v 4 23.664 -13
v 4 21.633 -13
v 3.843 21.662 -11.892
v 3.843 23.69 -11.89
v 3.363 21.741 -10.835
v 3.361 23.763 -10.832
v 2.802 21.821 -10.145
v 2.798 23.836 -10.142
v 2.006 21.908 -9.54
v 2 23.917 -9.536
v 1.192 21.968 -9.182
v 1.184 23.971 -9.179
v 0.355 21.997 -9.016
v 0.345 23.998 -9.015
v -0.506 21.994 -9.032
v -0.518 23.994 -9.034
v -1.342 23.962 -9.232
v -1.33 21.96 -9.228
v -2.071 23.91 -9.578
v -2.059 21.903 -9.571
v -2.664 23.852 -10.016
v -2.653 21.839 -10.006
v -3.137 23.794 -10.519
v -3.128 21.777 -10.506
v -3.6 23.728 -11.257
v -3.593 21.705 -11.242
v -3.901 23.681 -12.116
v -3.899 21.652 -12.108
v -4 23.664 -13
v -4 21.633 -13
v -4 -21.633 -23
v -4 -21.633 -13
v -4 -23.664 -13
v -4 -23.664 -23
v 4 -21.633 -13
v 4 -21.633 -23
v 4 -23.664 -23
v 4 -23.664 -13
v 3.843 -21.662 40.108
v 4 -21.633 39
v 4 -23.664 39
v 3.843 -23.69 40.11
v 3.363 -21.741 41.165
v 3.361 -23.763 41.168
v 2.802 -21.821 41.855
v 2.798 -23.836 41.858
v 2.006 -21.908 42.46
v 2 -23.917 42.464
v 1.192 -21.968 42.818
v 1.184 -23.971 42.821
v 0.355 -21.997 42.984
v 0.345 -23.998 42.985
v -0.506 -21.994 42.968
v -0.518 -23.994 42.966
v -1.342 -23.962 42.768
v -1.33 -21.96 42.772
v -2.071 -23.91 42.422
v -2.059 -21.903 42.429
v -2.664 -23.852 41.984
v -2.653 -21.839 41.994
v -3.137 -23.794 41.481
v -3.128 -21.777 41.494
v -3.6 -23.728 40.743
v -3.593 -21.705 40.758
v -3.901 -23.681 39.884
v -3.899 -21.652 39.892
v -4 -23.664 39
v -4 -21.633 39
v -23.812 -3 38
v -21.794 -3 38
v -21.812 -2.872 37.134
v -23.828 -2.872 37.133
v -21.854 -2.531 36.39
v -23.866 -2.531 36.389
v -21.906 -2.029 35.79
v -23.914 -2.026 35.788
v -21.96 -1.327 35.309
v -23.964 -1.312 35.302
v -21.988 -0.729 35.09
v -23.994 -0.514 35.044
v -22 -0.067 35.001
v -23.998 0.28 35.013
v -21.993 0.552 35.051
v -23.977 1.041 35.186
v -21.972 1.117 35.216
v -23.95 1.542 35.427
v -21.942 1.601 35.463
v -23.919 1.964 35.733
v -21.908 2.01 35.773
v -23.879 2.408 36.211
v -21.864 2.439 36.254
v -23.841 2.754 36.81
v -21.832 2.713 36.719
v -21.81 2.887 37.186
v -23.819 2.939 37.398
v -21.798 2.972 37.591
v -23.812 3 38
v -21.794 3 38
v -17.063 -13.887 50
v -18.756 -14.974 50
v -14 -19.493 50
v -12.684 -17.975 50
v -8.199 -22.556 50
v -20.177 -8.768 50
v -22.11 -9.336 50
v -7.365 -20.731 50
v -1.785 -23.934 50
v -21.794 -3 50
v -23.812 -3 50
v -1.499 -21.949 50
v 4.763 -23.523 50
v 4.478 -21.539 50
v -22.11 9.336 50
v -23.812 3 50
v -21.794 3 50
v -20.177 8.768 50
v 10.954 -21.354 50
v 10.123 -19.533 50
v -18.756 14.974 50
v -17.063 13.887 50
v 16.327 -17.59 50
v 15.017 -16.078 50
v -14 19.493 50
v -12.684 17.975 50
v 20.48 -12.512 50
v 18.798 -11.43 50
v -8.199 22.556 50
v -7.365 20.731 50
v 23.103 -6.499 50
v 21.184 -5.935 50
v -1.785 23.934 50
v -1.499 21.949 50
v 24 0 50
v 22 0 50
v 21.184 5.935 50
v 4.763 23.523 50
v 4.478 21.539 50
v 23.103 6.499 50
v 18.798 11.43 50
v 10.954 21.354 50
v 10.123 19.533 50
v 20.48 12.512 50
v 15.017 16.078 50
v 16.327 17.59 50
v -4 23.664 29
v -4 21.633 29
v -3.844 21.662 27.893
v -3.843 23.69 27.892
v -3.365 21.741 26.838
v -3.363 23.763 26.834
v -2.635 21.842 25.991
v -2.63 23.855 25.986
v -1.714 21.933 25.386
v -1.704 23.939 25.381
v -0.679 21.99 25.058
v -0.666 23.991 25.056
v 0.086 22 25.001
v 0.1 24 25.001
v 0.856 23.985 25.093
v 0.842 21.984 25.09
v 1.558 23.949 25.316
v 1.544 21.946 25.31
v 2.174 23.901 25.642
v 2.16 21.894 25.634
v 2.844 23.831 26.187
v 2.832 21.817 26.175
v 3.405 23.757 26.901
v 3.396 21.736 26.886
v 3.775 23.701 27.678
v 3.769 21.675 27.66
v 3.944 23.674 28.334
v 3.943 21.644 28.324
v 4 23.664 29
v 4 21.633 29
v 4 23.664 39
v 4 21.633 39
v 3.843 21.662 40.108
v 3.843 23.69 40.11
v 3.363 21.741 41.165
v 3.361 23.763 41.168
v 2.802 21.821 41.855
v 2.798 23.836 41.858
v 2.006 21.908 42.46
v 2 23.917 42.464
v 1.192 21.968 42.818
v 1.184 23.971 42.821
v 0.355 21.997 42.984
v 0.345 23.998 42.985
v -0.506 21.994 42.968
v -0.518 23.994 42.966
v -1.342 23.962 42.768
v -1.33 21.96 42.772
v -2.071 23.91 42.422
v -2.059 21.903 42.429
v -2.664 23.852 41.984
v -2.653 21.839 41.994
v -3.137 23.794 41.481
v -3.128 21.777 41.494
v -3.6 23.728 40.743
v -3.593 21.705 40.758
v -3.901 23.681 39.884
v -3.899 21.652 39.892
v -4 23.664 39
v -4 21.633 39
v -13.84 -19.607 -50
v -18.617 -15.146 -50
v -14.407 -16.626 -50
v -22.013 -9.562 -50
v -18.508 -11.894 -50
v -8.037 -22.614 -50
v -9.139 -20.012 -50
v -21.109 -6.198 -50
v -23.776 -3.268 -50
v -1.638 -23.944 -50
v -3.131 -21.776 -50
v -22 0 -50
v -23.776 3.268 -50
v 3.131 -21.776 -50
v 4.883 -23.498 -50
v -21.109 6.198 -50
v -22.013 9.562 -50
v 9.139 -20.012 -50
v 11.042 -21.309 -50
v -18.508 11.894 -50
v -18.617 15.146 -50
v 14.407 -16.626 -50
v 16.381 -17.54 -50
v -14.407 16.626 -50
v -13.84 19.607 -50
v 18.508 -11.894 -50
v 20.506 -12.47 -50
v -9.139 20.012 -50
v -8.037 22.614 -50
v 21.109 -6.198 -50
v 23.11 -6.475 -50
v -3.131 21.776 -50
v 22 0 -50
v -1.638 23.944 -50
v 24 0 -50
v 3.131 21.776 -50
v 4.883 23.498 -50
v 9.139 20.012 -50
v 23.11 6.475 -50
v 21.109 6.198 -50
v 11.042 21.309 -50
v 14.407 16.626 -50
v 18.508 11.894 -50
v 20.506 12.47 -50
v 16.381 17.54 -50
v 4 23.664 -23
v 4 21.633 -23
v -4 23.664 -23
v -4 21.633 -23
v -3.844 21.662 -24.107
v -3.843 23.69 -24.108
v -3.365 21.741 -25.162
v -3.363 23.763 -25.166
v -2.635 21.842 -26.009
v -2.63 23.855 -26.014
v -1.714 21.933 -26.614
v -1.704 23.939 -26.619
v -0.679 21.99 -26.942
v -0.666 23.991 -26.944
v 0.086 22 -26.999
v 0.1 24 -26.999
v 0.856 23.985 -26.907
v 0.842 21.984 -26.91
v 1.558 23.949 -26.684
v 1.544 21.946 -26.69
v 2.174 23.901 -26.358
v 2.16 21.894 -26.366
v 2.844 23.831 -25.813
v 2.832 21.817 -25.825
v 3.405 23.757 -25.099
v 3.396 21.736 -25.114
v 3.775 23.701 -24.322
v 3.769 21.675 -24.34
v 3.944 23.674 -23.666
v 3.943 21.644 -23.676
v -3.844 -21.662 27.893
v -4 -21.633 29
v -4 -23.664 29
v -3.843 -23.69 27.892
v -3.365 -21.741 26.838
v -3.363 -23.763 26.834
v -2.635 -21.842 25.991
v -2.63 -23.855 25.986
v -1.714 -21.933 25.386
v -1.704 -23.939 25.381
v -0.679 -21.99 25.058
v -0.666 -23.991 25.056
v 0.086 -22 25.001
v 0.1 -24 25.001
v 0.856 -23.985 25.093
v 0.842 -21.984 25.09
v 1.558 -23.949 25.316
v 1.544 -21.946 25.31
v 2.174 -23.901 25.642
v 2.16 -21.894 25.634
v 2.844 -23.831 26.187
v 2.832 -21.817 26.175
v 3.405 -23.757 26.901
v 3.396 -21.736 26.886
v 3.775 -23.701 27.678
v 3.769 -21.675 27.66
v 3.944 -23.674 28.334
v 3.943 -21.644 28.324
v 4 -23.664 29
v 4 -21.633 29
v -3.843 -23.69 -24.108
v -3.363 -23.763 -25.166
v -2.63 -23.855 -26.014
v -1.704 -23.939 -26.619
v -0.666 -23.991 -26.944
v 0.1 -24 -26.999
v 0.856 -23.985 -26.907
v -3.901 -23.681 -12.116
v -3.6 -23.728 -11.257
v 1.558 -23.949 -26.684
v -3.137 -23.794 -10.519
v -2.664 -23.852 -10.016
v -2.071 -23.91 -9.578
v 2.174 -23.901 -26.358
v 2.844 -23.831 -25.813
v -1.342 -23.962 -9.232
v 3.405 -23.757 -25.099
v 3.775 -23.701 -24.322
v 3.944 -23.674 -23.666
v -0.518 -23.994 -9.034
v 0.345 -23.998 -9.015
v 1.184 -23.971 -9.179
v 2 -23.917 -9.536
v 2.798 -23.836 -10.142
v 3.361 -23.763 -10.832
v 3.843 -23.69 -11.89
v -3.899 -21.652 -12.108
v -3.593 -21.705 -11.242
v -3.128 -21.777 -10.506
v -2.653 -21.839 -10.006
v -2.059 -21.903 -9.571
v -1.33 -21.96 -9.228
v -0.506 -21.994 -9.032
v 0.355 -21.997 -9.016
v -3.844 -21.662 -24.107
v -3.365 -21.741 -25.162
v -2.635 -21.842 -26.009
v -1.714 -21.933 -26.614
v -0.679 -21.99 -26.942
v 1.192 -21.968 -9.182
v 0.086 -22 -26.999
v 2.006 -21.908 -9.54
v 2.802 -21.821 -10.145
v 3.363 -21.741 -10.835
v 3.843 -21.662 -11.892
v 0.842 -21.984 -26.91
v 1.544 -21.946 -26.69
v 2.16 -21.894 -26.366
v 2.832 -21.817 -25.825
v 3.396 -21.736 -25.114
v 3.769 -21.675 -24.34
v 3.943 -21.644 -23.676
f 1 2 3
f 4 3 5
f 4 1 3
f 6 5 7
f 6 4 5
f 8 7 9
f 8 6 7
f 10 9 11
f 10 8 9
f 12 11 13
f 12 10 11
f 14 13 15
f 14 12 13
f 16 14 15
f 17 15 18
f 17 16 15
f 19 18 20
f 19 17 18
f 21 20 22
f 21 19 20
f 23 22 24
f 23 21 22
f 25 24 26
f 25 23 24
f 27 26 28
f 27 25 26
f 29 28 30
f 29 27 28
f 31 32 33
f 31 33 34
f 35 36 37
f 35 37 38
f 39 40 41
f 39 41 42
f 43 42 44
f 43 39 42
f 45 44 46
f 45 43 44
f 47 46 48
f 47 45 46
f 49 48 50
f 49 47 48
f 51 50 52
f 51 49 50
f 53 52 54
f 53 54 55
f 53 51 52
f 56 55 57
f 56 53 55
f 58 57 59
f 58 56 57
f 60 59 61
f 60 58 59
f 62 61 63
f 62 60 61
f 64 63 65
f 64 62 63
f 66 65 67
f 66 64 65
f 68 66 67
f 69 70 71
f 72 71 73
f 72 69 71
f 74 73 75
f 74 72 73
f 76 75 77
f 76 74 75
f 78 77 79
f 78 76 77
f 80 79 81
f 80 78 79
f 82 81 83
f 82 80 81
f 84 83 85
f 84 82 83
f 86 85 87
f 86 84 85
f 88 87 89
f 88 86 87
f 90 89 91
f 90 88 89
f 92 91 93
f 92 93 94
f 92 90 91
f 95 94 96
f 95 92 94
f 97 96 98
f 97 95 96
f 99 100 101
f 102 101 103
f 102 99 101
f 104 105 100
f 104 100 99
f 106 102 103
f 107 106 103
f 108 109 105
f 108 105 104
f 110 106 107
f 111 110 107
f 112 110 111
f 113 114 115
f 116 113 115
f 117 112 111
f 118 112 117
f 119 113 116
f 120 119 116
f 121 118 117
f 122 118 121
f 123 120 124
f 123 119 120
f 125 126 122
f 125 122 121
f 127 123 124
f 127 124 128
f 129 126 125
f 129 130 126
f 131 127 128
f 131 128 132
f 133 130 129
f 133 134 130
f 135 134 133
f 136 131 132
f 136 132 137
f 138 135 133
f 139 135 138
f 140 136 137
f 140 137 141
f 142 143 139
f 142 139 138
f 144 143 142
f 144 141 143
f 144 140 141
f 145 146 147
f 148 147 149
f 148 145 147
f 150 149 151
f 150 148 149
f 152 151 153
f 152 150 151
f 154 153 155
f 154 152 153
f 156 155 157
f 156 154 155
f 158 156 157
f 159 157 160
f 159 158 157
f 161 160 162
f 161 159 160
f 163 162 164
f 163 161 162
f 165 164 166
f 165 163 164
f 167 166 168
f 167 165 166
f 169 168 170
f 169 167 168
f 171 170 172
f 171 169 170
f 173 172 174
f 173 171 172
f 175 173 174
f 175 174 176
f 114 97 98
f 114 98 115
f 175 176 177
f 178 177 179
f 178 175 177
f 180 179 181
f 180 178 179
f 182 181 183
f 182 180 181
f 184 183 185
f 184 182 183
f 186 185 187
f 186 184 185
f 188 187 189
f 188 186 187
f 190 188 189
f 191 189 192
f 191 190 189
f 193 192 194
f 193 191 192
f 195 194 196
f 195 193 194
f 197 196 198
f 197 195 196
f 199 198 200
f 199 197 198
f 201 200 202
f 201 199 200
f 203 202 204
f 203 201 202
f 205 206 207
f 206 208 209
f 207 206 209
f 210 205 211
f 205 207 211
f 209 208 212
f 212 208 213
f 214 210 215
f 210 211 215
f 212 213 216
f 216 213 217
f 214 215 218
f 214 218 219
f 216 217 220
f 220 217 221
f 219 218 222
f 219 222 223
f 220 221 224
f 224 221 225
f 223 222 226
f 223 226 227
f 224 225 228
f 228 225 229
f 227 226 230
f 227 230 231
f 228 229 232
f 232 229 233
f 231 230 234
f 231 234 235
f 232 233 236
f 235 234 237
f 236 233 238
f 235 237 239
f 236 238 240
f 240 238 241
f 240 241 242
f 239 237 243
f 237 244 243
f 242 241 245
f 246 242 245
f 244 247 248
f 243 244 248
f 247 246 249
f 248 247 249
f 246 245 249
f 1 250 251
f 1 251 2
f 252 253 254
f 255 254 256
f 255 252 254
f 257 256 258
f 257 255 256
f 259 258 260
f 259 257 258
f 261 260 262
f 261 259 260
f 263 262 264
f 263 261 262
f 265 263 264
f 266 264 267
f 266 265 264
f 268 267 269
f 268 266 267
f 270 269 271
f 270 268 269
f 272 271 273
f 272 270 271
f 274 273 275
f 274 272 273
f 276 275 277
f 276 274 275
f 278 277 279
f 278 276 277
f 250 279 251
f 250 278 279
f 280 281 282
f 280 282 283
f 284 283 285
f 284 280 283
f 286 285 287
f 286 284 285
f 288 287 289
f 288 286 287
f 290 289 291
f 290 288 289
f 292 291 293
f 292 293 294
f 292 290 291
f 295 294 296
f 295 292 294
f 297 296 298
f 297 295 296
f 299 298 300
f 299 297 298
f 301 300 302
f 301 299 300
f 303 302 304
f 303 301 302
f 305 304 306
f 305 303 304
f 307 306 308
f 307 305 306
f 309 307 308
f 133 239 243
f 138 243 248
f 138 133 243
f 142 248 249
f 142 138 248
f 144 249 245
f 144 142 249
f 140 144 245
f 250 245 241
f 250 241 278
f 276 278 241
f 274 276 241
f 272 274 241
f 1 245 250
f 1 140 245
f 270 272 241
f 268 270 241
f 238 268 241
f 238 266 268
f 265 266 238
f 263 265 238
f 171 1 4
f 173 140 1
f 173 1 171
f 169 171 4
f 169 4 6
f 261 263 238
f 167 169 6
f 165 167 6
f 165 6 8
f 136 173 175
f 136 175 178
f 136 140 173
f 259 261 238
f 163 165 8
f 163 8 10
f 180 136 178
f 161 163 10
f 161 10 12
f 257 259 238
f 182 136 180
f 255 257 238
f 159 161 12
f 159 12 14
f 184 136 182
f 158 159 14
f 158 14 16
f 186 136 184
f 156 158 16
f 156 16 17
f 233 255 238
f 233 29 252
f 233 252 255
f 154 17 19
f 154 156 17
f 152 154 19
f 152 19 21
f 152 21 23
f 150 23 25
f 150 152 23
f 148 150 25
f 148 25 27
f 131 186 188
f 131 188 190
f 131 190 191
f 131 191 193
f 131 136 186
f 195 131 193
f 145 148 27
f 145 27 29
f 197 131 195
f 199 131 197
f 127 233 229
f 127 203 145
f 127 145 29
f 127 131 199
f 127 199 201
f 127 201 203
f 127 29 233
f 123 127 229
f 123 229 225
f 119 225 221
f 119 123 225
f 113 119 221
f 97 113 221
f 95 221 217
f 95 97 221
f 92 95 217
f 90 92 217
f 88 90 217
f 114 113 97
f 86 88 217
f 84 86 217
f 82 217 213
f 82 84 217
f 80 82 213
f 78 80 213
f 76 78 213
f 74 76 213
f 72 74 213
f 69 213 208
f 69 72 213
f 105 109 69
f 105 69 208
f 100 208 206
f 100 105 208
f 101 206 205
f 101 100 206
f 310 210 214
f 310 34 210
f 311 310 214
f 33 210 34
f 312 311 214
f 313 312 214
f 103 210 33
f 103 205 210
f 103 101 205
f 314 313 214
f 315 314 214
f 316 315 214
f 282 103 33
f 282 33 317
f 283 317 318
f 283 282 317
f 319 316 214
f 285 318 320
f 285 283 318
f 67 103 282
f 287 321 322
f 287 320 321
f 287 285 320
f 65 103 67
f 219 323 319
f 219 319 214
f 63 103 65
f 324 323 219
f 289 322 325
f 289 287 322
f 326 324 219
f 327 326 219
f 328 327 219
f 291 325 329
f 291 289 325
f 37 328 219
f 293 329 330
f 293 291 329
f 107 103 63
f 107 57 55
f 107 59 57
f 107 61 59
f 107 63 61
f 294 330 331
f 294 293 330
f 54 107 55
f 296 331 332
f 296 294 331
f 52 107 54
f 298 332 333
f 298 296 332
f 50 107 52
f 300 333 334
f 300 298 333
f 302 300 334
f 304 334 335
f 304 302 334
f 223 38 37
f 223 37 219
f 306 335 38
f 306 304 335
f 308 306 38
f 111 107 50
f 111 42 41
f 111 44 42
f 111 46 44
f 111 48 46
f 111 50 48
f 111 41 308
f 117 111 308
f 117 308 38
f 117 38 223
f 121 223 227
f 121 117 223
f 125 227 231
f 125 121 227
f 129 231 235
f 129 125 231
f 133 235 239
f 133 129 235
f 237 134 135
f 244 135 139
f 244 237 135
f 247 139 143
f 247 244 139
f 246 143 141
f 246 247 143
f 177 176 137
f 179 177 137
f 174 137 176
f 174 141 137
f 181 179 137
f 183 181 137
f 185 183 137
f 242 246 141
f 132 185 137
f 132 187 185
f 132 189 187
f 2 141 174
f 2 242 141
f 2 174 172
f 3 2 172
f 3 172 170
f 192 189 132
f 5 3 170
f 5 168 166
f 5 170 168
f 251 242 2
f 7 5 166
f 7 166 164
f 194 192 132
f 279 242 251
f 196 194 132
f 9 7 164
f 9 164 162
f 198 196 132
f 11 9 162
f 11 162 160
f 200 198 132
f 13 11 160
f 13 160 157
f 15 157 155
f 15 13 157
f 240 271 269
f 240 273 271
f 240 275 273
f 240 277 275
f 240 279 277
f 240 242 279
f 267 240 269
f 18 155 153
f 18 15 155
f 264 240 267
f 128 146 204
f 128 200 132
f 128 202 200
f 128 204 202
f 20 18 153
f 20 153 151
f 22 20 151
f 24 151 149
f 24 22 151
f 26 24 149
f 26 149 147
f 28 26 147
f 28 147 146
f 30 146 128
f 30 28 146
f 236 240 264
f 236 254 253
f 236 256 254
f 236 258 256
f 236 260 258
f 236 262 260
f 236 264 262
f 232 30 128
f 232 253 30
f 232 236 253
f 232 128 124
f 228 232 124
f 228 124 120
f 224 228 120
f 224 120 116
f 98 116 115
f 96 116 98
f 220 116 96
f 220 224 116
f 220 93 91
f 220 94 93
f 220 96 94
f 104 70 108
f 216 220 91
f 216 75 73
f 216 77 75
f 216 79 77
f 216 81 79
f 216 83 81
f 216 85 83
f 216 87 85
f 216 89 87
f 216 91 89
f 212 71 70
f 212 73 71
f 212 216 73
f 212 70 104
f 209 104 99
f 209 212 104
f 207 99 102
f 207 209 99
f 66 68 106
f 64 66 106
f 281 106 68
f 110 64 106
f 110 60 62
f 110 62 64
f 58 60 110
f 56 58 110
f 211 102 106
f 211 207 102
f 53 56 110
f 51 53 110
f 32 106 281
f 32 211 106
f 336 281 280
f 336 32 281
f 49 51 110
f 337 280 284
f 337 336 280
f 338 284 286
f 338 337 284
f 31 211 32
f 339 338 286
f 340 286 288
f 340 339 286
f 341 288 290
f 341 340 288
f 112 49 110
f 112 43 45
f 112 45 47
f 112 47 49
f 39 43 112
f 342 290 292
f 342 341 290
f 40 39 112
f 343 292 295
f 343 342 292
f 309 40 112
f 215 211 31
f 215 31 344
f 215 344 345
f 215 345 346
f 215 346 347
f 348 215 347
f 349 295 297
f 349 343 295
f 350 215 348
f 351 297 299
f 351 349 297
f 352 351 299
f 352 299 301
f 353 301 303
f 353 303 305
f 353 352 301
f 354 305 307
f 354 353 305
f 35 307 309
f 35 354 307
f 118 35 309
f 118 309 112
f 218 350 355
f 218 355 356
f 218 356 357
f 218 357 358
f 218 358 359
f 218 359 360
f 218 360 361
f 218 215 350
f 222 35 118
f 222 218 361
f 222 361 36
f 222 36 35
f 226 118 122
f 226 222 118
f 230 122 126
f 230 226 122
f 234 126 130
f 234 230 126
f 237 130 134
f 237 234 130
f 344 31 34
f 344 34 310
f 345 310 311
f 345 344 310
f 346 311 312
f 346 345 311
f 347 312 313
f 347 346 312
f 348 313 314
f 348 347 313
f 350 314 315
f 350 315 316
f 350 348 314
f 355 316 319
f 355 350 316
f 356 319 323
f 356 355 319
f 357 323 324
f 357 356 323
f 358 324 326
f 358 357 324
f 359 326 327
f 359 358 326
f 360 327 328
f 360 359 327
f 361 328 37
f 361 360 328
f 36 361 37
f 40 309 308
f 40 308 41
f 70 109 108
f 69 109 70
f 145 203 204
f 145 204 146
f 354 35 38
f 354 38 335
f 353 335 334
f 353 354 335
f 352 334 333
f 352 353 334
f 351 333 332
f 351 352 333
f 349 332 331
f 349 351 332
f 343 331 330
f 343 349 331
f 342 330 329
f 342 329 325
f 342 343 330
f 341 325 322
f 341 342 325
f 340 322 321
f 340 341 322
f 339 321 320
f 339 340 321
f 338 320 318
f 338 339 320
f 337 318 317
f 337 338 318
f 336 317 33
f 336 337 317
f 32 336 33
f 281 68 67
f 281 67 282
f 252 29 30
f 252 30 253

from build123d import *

# Parameters (mm, degrees)
SKETCH_1_R          = 24
SKETCH_1_R_2        = 22
EXTRUDE_1_DEPTH     = 50
CUT_EXTRUDE_1_DEPTH = 20
CUT_EXTRUDE_2_DEPTH = 74.34848345


with BuildPart() as part:
    # 草图1 → 凸台-拉伸1 (new, symmetric)
    with BuildSketch(Plane.XY):
        Circle(SKETCH_1_R)
        Circle(SKETCH_1_R_2, mode=Mode.SUBTRACT)
    extrude(amount=EXTRUDE_1_DEPTH, both=True)

    # 草图2 → 切除-拉伸1 (cut)
    with BuildSketch(Plane.ZY.offset(24)):
        with BuildLine():
            Line((38, 3), (50, 3))
            Line((50, 3), (50, -3))
            Line((50, -3), (38, -3))
            ThreePointArc((38, -3), (35, 0), (38, 3))
        make_face()
    extrude(amount=-CUT_EXTRUDE_1_DEPTH, mode=Mode.SUBTRACT)

    # 草图3 → 切除-拉伸2 (cut, through all)
    with BuildSketch(Plane(origin=(0, 24, 0), x_dir=(1, 0, 0), z_dir=(0, 1, 0))):
        with BuildLine():
            Line((-4, 13), (-4, 23))
            ThreePointArc((-4, 23), (0, 27), (4, 23))
            Line((4, 23), (4, 13))
            ThreePointArc((4, 13), (0, 9), (-4, 13))
        make_face()
        with BuildLine():
            Line((-4, -39), (-4, -29))
            ThreePointArc((-4, -29), (0, -25), (4, -29))
            Line((4, -29), (4, -39))
            ThreePointArc((4, -39), (0, -43), (-4, -39))
        make_face()
    extrude(amount=-CUT_EXTRUDE_2_DEPTH, mode=Mode.SUBTRACT)


solid = part.part
